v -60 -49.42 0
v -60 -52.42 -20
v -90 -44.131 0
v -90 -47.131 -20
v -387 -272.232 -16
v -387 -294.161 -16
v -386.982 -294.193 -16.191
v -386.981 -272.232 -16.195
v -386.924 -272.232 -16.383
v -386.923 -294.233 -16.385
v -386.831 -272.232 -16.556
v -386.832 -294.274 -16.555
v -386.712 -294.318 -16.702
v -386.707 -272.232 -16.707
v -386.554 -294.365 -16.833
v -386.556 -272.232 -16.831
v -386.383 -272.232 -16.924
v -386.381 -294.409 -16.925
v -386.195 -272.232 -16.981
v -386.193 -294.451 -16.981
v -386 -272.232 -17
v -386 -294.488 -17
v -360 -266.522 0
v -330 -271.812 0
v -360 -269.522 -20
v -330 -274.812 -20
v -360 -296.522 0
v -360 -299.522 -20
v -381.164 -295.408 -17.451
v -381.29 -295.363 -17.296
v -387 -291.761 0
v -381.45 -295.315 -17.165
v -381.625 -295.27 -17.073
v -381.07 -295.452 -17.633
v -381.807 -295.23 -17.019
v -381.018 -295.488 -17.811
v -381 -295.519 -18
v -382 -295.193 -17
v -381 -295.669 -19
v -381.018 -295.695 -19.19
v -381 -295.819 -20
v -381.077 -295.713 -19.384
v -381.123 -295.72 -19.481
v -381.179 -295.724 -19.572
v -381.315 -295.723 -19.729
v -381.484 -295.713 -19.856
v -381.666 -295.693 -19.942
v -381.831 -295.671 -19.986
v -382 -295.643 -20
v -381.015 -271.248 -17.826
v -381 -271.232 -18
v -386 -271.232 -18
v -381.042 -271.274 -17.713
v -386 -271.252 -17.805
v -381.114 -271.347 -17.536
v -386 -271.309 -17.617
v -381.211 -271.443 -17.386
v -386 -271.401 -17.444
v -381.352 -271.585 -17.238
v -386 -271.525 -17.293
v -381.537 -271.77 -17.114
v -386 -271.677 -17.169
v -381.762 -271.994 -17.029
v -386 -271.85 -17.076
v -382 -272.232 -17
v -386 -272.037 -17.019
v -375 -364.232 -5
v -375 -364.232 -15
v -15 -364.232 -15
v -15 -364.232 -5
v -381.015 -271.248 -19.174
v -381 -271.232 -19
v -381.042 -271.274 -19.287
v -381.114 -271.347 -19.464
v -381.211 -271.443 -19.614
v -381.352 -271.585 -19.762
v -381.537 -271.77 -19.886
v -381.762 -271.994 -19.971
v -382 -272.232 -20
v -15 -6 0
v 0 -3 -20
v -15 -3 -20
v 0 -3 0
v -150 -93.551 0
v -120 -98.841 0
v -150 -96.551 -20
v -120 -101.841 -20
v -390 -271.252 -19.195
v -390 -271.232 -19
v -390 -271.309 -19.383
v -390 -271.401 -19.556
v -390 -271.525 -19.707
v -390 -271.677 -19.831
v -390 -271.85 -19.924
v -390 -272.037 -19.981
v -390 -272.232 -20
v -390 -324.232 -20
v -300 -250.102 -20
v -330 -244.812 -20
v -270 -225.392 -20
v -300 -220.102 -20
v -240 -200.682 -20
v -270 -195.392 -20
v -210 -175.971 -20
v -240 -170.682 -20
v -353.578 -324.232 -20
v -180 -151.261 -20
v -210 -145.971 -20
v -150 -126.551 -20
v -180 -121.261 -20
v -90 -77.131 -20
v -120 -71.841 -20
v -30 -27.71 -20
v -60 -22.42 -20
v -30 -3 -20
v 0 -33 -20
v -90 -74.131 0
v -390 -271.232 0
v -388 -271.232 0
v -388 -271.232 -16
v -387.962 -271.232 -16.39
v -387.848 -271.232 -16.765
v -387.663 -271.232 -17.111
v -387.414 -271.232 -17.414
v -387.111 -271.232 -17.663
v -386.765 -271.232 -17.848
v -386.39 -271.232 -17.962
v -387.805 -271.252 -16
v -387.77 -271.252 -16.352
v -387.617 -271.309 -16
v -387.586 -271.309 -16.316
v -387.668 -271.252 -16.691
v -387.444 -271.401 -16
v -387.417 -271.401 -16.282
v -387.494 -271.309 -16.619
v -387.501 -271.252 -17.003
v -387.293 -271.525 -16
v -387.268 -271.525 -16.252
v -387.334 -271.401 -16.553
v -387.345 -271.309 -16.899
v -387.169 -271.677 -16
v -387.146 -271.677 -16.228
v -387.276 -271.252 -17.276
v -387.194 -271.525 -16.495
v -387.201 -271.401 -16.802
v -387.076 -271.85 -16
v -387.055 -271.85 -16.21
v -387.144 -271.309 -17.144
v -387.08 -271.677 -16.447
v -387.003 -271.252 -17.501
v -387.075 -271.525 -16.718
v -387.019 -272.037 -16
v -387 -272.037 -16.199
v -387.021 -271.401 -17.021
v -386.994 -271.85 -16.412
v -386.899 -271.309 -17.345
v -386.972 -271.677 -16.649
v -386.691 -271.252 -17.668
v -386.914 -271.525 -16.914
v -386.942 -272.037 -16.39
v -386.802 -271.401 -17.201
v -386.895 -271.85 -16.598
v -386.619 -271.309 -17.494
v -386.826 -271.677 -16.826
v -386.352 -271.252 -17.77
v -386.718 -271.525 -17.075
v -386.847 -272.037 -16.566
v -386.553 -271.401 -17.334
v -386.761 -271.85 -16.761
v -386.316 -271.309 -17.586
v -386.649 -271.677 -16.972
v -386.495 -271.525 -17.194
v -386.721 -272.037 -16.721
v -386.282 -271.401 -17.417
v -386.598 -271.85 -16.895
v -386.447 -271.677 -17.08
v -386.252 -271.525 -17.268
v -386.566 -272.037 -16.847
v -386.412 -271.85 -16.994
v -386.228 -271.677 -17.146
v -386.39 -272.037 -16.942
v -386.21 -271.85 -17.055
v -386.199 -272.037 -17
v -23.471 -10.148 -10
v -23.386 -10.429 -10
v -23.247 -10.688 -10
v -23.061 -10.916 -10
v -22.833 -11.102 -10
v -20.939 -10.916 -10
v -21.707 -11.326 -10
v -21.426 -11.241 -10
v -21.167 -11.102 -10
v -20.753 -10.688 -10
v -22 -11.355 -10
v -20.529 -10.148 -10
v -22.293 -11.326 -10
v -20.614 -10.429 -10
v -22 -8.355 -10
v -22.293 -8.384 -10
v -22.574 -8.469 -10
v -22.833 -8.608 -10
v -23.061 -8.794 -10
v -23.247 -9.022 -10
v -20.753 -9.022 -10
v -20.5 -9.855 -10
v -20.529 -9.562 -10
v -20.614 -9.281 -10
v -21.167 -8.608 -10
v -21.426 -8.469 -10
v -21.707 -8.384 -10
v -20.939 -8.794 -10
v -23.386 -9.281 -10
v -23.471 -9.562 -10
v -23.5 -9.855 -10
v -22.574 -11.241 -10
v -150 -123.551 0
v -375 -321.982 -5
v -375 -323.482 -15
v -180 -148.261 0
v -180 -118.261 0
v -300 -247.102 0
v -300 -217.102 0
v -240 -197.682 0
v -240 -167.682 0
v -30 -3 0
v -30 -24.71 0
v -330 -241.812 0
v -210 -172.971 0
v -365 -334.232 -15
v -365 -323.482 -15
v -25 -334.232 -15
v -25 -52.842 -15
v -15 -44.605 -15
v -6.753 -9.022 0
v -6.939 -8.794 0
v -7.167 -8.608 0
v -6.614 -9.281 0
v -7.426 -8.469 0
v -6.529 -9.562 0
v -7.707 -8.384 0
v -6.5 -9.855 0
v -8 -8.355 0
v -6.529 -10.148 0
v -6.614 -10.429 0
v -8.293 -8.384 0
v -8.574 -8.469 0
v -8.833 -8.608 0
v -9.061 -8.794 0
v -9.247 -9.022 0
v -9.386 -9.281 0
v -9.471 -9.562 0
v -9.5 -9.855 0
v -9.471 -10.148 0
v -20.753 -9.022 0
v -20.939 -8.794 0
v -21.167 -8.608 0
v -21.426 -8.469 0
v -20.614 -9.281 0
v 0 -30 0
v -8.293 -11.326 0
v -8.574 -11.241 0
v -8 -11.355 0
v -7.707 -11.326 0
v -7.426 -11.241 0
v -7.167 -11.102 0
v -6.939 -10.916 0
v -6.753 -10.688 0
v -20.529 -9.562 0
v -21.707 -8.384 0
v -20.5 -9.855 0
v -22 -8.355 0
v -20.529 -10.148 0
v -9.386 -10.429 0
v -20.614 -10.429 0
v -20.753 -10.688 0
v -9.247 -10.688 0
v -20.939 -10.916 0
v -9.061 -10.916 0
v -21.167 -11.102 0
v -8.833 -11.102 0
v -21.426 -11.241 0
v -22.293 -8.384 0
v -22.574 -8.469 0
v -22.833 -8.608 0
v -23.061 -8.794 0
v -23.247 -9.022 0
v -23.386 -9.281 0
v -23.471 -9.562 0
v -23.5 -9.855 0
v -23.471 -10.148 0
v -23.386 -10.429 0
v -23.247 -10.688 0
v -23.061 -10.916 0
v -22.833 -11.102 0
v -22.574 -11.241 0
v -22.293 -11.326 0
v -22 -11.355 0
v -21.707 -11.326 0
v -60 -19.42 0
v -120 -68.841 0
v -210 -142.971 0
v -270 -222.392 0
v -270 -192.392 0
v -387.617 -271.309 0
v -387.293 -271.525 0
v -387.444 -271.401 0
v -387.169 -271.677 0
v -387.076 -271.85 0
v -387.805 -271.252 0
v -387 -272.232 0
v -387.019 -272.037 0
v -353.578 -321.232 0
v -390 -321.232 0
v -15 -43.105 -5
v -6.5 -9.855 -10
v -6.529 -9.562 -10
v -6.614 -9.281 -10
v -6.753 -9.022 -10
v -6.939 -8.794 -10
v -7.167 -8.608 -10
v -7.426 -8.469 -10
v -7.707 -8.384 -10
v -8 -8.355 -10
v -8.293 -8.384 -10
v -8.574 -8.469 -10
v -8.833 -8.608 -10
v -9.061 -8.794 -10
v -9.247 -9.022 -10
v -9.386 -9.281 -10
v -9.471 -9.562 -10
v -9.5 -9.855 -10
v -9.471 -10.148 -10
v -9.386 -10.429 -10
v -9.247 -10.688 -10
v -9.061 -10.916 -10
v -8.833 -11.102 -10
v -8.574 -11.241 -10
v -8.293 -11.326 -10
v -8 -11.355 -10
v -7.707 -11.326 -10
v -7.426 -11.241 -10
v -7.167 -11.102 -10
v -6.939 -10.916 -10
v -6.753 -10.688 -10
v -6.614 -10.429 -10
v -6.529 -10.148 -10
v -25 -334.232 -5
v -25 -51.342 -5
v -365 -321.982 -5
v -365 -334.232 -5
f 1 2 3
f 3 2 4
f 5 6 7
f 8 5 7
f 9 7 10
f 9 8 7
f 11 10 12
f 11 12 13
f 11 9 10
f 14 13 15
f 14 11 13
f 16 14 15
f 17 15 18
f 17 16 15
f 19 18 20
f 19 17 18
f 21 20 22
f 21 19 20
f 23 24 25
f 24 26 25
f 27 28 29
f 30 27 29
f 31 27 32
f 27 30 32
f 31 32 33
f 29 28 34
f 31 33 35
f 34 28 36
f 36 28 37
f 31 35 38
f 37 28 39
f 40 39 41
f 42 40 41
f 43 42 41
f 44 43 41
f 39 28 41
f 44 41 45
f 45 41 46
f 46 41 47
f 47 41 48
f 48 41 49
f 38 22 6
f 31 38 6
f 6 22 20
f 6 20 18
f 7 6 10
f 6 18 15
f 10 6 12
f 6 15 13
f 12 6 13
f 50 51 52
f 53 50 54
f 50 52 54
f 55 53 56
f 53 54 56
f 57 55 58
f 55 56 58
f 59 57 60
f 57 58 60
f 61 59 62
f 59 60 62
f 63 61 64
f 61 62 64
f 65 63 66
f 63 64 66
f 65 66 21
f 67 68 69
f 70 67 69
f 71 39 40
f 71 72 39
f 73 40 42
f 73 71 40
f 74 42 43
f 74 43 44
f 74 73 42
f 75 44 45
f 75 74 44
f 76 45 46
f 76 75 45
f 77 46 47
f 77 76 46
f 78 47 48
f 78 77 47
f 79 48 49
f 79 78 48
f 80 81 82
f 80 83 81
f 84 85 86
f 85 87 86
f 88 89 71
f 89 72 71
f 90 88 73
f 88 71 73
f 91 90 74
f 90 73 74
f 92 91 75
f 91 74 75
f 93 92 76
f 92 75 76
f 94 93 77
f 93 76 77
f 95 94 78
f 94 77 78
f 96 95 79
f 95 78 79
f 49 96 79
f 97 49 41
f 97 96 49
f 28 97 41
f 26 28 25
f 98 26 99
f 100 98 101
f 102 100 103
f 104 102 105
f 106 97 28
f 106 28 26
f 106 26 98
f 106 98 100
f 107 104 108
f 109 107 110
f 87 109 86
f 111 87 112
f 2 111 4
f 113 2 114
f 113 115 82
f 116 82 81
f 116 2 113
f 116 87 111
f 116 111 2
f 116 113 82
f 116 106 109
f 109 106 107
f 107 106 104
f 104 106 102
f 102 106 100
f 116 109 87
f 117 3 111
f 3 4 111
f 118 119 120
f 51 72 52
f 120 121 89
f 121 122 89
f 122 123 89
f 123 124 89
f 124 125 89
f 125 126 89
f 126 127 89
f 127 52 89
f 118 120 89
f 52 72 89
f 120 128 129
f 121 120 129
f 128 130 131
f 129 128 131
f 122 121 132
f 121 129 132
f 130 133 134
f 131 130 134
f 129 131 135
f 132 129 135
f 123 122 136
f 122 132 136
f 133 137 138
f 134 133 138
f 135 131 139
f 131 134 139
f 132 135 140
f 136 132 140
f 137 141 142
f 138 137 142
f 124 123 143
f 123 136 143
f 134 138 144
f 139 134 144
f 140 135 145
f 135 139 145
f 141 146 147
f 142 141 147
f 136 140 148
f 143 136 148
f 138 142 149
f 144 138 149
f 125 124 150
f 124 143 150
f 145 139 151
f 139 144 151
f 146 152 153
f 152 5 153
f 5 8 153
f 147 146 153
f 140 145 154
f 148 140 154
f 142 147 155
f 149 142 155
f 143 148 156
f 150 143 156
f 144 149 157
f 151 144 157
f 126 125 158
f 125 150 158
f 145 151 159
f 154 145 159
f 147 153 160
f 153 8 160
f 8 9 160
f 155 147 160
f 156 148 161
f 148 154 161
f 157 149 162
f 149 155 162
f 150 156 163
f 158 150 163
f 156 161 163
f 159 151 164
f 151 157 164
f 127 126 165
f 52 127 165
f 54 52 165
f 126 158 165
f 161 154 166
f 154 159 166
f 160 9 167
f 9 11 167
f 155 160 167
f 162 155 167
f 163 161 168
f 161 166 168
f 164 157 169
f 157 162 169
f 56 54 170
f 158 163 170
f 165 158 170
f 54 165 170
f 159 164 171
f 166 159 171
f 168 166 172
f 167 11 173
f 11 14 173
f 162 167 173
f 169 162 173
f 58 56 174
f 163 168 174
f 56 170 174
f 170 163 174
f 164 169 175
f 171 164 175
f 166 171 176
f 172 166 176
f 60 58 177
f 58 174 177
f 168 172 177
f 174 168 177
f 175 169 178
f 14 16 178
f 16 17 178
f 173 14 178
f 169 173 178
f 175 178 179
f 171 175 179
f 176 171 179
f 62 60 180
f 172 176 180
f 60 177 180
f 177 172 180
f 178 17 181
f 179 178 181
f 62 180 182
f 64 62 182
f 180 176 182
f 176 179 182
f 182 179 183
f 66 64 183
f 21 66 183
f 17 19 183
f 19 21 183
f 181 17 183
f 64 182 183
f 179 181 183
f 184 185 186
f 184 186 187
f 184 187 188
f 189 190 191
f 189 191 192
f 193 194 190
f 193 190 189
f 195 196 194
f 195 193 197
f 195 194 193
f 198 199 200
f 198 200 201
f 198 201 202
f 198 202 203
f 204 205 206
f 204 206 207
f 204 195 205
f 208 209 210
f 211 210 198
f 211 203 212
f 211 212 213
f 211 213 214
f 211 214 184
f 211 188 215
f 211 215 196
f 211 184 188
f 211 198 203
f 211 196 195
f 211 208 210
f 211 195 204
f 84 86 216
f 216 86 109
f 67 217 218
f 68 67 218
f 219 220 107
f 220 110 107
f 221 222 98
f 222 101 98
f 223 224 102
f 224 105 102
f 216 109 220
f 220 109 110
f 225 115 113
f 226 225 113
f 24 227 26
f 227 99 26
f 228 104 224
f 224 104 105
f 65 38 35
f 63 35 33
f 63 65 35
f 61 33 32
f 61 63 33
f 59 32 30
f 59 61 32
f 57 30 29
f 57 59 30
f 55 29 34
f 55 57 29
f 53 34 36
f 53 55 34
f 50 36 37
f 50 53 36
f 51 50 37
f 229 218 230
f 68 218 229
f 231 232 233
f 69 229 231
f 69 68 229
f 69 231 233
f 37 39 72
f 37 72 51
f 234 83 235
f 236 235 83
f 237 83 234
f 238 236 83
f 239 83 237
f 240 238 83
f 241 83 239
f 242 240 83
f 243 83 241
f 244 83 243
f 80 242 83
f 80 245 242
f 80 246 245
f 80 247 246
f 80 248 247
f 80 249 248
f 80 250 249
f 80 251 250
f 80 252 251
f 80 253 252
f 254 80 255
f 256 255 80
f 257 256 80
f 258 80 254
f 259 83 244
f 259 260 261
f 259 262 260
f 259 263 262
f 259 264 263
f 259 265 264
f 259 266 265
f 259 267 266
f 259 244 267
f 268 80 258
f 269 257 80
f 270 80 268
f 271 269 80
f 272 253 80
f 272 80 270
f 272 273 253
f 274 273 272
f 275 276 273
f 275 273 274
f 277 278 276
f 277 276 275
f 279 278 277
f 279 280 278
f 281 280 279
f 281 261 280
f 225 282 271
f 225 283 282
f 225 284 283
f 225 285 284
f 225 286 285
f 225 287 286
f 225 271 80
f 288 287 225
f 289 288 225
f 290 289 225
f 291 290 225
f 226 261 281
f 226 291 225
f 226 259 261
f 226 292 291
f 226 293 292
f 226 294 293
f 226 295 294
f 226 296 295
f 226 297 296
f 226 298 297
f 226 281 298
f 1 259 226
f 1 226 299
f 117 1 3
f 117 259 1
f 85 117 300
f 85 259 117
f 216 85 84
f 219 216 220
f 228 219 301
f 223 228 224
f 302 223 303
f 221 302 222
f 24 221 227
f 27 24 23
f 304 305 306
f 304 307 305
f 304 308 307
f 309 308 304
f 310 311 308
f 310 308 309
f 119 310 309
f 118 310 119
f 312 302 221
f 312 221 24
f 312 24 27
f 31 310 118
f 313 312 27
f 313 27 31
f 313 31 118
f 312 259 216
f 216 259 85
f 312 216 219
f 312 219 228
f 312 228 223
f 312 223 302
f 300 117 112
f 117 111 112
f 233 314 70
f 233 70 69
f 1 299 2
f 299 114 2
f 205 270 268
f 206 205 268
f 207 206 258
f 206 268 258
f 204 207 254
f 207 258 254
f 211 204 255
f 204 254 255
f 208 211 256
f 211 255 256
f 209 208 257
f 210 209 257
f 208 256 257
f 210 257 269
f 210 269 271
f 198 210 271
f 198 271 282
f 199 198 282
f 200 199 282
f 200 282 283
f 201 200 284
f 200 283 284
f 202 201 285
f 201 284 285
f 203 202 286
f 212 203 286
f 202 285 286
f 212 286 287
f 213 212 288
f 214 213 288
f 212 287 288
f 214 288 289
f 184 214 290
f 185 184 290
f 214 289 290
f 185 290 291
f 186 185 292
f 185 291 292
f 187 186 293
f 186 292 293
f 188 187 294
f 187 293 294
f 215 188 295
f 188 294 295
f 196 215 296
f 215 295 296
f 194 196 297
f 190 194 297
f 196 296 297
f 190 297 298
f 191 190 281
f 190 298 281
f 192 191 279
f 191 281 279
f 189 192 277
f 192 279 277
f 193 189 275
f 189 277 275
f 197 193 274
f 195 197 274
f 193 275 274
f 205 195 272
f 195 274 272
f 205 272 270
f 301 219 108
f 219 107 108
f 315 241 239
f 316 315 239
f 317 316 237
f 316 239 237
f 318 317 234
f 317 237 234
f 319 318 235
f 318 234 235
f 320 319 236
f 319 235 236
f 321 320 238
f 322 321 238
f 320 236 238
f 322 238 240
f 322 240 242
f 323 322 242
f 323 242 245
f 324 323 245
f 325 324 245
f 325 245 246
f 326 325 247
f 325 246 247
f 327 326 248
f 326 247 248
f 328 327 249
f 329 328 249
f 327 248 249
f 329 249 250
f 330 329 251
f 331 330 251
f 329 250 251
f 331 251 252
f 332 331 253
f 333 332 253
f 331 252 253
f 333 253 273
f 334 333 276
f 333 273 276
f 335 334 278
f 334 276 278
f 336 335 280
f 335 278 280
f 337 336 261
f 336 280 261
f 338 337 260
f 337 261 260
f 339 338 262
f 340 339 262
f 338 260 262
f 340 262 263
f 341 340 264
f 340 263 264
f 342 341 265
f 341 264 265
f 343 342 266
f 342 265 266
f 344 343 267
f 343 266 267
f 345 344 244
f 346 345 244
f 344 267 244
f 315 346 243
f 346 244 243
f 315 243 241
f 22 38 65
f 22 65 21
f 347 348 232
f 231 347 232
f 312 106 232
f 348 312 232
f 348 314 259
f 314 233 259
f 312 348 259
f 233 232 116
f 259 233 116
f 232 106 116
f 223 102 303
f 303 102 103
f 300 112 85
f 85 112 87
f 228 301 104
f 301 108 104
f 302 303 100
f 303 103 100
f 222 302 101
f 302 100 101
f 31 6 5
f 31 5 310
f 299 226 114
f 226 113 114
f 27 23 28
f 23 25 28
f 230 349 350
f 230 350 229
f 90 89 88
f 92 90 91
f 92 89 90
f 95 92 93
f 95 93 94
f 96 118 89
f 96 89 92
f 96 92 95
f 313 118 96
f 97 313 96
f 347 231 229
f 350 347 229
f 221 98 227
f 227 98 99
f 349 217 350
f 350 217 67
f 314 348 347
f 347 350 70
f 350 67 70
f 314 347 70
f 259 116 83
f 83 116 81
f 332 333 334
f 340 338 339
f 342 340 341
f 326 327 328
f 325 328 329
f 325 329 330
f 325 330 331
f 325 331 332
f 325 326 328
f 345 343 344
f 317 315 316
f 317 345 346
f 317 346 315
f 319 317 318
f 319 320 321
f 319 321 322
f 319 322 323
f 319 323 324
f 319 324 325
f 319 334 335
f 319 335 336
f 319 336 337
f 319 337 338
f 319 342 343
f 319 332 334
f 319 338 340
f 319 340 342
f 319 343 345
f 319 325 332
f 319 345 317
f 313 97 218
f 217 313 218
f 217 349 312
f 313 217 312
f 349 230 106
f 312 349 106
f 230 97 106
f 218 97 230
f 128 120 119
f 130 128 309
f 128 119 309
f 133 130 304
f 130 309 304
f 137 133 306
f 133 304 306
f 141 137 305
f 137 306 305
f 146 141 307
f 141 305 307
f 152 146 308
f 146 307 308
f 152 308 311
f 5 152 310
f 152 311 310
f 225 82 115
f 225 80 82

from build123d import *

# Parameters (mm, degrees)
BOSS_EXTRUDE3_DEPTH      = 20
BOSS_EXTRUDE3_DEPTH_BACK = 13
FILLET2_R                = 1
BOSS_EXTRUDE4_DEPTH      = 20
BOSS_EXTRUDE4_DEPTH_BACK = 40
SKETCH10_W               = 10
SKETCH10_H               = 10
BOSS_EXTRUDE5_DEPTH      = 300
BOSS_EXTRUDE5_DEPTH_BACK = 40
SKETCH12_W               = 10
SKETCH12_H               = 10
SKETCH13_W               = 360
SKETCH13_H               = 30
BOSS_EXTRUDE6_DEPTH      = 10
SKETCH14_R               = 1.5
CUT_EXTRUDE1_DEPTH       = 10


with BuildPart() as part:
    # Sketch1 → Loft1 section 0
    with BuildSketch(Plane.XY):
        with BuildLine():
            Line((0, 0), (-30, 5.289809421))
            Line((-30, 5.289809421), (-30, -24.710190579))
            Line((-30, -24.710190579), (-60, -19.420381157))
            Line((-60, -19.420381157), (-60, -49.420381157))
            Line((-60, -49.420381157), (-90, -44.130571736))
            Line((-90, -44.130571736), (-90, -74.130571736))
            Line((-90, -74.130571736), (-120, -68.840762315))
            Line((-120, -68.840762315), (-120, -98.840762315))
            Line((-120, -98.840762315), (-150, -93.550952894))
            Line((-150, -93.550952894), (-150, -123.550952894))
            Line((-150, -123.550952894), (-180, -118.261143472))
            Line((-180, -118.261143472), (-180, -148.261143472))
            Line((-180, -148.261143472), (-210, -142.971334051))
            Line((-210, -142.971334051), (-210, -172.971334051))
            Line((-210, -172.971334051), (-240, -167.68152463))
            Line((-240, -167.68152463), (-240, -197.68152463))
            Line((-240, -197.68152463), (-270, -192.391715209))
            Line((-270, -192.391715209), (-270, -222.391715209))
            Line((-270, -222.391715209), (-300, -217.101905787))
            Line((-300, -217.101905787), (-300, -247.101905787))
            Line((-300, -247.101905787), (-330, -241.812096366))
            Line((-330, -241.812096366), (-330, -271.812096366))
            Line((-330, -271.812096366), (-360, -266.522286945))
            Line((-360, -266.522286945), (-360, -296.522286945))
            Line((-360, -296.522286945), (-390, -291.232477524))
            Line((-390, -291.232477524), (-390, -321.232477524))
            Line((-390, -321.232477524), (-353.577779899, -321.232477524))
            Line((-353.577779899, -321.232477524), (0, -30))
            Line((0, -30), (0, 0))
        make_face()
    # Sketch2 → Loft1 section 1
    with BuildSketch(Plane.XY.offset(-20)):
        with BuildLine():
            Line((-353.577779899, -324.232477524), (-390, -324.232477524))
            Line((-390, -324.232477524), (-390, -294.232477524))
            Line((-390, -294.232477524), (-360, -299.522286945))
            Line((-360, -299.522286945), (-360, -269.522286945))
            Line((-360, -269.522286945), (-330, -274.812096366))
            Line((-330, -274.812096366), (-330, -244.812096366))
            Line((-330, -244.812096366), (-300, -250.101905787))
            Line((-300, -250.101905787), (-300, -220.101905787))
            Line((-300, -220.101905787), (-270, -225.391715209))
            Line((-270, -225.391715209), (-270, -195.391715209))
            Line((-270, -195.391715209), (-240, -200.68152463))
            Line((-240, -200.68152463), (-240, -170.68152463))
            Line((-240, -170.68152463), (-210, -175.971334051))
            Line((-210, -175.971334051), (-210, -145.971334051))
            Line((-210, -145.971334051), (-180, -151.261143472))
            Line((-180, -151.261143472), (-180, -121.261143472))
            Line((-180, -121.261143472), (-150, -126.550952894))
            Line((-150, -126.550952894), (-150, -96.550952894))
            Line((-150, -96.550952894), (-120, -101.840762315))
            Line((-120, -101.840762315), (-120, -71.840762315))
            Line((-120, -71.840762315), (-90, -77.130571736))
            Line((-90, -77.130571736), (-90, -47.130571736))
            Line((-90, -47.130571736), (-60, -52.420381157))
            Line((-60, -52.420381157), (-60, -22.420381157))
            Line((-60, -22.420381157), (-30, -27.710190579))
            Line((-30, -27.710190579), (-30, 2.289809421))
            Line((-30, 2.289809421), (0, -3))
            Line((0, -3), (0, -33))
            Line((0, -33), (-353.577779899, -324.232477524))
        make_face()
    loft()

    # Sketch8 → Cut-Loft1 section 0
    with BuildSketch(Plane(origin=(0, 0, -20), x_dir=(-1, 0, 0), z_dir=(0, 0, -1))):
        with BuildLine():
            Line((0, -3), (30, -3))
            Line((30, -3), (30, 5.289809421))
            Line((30, 5.289809421), (0, 5.289809421))
            Line((0, 5.289809421), (0, -3))
        make_face()
    # Sketch7 → Cut-Loft1 section 1
    with BuildSketch(Plane.XY):
        with BuildLine():
            Line((0, 5.289809421), (-30, 5.289809421))
            Line((-30, 5.289809421), (-30, -3))
            Line((-30, -3), (-15, -6))
            Line((-15, -6), (0, -3))
            Line((0, -3), (0, 5.289809421))
        make_face()
    loft(mode=Mode.SUBTRACT)

    # Sketch9 → Boss-Extrude3 (add, two sides: drawn at the far end of the back side and taken through both)
    with BuildSketch(Plane(origin=(0, -291.232477524, 0), x_dir=(1, 0, 0), z_dir=(0, 1, 0)).offset(-BOSS_EXTRUDE3_DEPTH_BACK)):
        Polygon((-390, 0), (-390, 20), (-381, 20), (-381, 17), (-387, 17), (-387, 0), align=None)
    extrude(amount=BOSS_EXTRUDE3_DEPTH + BOSS_EXTRUDE3_DEPTH_BACK)

    # Fillet2
    fillet2_edges = [part.edges().sort_by_distance(p)[0] for p in [
        (-387, -271.232477524, -8.5),
        (-385.5, -271.232477524, -20),
        (-384, -271.232477524, -17),
        (-381, -283.525948937, -20),
        (-381, -283.300948937, -17),
        (-387, -282.771967995, -17),
    ]]
    fillet(fillet2_edges, radius=FILLET2_R)

    # Sketch12 → Boss-Extrude5 (add, two sides: drawn at the far end of the back side and taken through both)
    with BuildSketch(Plane(origin=(0, -324.232477524, 0), x_dir=(1, 0, 0), z_dir=(0, 1, 0)).offset(-BOSS_EXTRUDE5_DEPTH_BACK)):
        with Locations((-20, 10)):
            Rectangle(SKETCH12_W, SKETCH12_H)
    extrude(amount=BOSS_EXTRUDE5_DEPTH + BOSS_EXTRUDE5_DEPTH_BACK)



with BuildPart() as body_2:
    # Sketch10 → Boss-Extrude4 (new, two sides: drawn at the far end of the back side and taken through both)
    with BuildSketch(Plane(origin=(0, -324.232477524, 0), x_dir=(1, 0, 0), z_dir=(0, 1, 0)).offset(-BOSS_EXTRUDE4_DEPTH_BACK)):
        with Locations((-370, 10)):
            Rectangle(SKETCH10_W, SKETCH10_H)
    extrude(amount=BOSS_EXTRUDE4_DEPTH + BOSS_EXTRUDE4_DEPTH_BACK)


with BuildPart() as part_1:
    add(part.part)

    add(body_2.part)  # Boss-Extrude6 merges body 2
    # Sketch13 → Boss-Extrude6 (add)
    with BuildSketch(Plane(origin=(0, 0, -15), x_dir=(-1, 0, 0), z_dir=(0, 0, -1))):
        with Locations((195, -349.232477524)):
            Rectangle(SKETCH13_W, SKETCH13_H)
    extrude(amount=-BOSS_EXTRUDE6_DEPTH)

    # Sketch14 → Cut-Extrude1 (cut)
    with BuildSketch(Plane.XY):
        with Locations((-22, -9.855095289)):
            Circle(SKETCH14_R)
        with Locations((-8, -9.855095289)):
            Circle(SKETCH14_R)
    extrude(amount=-CUT_EXTRUDE1_DEPTH, mode=Mode.SUBTRACT)


solid = part_1.part
